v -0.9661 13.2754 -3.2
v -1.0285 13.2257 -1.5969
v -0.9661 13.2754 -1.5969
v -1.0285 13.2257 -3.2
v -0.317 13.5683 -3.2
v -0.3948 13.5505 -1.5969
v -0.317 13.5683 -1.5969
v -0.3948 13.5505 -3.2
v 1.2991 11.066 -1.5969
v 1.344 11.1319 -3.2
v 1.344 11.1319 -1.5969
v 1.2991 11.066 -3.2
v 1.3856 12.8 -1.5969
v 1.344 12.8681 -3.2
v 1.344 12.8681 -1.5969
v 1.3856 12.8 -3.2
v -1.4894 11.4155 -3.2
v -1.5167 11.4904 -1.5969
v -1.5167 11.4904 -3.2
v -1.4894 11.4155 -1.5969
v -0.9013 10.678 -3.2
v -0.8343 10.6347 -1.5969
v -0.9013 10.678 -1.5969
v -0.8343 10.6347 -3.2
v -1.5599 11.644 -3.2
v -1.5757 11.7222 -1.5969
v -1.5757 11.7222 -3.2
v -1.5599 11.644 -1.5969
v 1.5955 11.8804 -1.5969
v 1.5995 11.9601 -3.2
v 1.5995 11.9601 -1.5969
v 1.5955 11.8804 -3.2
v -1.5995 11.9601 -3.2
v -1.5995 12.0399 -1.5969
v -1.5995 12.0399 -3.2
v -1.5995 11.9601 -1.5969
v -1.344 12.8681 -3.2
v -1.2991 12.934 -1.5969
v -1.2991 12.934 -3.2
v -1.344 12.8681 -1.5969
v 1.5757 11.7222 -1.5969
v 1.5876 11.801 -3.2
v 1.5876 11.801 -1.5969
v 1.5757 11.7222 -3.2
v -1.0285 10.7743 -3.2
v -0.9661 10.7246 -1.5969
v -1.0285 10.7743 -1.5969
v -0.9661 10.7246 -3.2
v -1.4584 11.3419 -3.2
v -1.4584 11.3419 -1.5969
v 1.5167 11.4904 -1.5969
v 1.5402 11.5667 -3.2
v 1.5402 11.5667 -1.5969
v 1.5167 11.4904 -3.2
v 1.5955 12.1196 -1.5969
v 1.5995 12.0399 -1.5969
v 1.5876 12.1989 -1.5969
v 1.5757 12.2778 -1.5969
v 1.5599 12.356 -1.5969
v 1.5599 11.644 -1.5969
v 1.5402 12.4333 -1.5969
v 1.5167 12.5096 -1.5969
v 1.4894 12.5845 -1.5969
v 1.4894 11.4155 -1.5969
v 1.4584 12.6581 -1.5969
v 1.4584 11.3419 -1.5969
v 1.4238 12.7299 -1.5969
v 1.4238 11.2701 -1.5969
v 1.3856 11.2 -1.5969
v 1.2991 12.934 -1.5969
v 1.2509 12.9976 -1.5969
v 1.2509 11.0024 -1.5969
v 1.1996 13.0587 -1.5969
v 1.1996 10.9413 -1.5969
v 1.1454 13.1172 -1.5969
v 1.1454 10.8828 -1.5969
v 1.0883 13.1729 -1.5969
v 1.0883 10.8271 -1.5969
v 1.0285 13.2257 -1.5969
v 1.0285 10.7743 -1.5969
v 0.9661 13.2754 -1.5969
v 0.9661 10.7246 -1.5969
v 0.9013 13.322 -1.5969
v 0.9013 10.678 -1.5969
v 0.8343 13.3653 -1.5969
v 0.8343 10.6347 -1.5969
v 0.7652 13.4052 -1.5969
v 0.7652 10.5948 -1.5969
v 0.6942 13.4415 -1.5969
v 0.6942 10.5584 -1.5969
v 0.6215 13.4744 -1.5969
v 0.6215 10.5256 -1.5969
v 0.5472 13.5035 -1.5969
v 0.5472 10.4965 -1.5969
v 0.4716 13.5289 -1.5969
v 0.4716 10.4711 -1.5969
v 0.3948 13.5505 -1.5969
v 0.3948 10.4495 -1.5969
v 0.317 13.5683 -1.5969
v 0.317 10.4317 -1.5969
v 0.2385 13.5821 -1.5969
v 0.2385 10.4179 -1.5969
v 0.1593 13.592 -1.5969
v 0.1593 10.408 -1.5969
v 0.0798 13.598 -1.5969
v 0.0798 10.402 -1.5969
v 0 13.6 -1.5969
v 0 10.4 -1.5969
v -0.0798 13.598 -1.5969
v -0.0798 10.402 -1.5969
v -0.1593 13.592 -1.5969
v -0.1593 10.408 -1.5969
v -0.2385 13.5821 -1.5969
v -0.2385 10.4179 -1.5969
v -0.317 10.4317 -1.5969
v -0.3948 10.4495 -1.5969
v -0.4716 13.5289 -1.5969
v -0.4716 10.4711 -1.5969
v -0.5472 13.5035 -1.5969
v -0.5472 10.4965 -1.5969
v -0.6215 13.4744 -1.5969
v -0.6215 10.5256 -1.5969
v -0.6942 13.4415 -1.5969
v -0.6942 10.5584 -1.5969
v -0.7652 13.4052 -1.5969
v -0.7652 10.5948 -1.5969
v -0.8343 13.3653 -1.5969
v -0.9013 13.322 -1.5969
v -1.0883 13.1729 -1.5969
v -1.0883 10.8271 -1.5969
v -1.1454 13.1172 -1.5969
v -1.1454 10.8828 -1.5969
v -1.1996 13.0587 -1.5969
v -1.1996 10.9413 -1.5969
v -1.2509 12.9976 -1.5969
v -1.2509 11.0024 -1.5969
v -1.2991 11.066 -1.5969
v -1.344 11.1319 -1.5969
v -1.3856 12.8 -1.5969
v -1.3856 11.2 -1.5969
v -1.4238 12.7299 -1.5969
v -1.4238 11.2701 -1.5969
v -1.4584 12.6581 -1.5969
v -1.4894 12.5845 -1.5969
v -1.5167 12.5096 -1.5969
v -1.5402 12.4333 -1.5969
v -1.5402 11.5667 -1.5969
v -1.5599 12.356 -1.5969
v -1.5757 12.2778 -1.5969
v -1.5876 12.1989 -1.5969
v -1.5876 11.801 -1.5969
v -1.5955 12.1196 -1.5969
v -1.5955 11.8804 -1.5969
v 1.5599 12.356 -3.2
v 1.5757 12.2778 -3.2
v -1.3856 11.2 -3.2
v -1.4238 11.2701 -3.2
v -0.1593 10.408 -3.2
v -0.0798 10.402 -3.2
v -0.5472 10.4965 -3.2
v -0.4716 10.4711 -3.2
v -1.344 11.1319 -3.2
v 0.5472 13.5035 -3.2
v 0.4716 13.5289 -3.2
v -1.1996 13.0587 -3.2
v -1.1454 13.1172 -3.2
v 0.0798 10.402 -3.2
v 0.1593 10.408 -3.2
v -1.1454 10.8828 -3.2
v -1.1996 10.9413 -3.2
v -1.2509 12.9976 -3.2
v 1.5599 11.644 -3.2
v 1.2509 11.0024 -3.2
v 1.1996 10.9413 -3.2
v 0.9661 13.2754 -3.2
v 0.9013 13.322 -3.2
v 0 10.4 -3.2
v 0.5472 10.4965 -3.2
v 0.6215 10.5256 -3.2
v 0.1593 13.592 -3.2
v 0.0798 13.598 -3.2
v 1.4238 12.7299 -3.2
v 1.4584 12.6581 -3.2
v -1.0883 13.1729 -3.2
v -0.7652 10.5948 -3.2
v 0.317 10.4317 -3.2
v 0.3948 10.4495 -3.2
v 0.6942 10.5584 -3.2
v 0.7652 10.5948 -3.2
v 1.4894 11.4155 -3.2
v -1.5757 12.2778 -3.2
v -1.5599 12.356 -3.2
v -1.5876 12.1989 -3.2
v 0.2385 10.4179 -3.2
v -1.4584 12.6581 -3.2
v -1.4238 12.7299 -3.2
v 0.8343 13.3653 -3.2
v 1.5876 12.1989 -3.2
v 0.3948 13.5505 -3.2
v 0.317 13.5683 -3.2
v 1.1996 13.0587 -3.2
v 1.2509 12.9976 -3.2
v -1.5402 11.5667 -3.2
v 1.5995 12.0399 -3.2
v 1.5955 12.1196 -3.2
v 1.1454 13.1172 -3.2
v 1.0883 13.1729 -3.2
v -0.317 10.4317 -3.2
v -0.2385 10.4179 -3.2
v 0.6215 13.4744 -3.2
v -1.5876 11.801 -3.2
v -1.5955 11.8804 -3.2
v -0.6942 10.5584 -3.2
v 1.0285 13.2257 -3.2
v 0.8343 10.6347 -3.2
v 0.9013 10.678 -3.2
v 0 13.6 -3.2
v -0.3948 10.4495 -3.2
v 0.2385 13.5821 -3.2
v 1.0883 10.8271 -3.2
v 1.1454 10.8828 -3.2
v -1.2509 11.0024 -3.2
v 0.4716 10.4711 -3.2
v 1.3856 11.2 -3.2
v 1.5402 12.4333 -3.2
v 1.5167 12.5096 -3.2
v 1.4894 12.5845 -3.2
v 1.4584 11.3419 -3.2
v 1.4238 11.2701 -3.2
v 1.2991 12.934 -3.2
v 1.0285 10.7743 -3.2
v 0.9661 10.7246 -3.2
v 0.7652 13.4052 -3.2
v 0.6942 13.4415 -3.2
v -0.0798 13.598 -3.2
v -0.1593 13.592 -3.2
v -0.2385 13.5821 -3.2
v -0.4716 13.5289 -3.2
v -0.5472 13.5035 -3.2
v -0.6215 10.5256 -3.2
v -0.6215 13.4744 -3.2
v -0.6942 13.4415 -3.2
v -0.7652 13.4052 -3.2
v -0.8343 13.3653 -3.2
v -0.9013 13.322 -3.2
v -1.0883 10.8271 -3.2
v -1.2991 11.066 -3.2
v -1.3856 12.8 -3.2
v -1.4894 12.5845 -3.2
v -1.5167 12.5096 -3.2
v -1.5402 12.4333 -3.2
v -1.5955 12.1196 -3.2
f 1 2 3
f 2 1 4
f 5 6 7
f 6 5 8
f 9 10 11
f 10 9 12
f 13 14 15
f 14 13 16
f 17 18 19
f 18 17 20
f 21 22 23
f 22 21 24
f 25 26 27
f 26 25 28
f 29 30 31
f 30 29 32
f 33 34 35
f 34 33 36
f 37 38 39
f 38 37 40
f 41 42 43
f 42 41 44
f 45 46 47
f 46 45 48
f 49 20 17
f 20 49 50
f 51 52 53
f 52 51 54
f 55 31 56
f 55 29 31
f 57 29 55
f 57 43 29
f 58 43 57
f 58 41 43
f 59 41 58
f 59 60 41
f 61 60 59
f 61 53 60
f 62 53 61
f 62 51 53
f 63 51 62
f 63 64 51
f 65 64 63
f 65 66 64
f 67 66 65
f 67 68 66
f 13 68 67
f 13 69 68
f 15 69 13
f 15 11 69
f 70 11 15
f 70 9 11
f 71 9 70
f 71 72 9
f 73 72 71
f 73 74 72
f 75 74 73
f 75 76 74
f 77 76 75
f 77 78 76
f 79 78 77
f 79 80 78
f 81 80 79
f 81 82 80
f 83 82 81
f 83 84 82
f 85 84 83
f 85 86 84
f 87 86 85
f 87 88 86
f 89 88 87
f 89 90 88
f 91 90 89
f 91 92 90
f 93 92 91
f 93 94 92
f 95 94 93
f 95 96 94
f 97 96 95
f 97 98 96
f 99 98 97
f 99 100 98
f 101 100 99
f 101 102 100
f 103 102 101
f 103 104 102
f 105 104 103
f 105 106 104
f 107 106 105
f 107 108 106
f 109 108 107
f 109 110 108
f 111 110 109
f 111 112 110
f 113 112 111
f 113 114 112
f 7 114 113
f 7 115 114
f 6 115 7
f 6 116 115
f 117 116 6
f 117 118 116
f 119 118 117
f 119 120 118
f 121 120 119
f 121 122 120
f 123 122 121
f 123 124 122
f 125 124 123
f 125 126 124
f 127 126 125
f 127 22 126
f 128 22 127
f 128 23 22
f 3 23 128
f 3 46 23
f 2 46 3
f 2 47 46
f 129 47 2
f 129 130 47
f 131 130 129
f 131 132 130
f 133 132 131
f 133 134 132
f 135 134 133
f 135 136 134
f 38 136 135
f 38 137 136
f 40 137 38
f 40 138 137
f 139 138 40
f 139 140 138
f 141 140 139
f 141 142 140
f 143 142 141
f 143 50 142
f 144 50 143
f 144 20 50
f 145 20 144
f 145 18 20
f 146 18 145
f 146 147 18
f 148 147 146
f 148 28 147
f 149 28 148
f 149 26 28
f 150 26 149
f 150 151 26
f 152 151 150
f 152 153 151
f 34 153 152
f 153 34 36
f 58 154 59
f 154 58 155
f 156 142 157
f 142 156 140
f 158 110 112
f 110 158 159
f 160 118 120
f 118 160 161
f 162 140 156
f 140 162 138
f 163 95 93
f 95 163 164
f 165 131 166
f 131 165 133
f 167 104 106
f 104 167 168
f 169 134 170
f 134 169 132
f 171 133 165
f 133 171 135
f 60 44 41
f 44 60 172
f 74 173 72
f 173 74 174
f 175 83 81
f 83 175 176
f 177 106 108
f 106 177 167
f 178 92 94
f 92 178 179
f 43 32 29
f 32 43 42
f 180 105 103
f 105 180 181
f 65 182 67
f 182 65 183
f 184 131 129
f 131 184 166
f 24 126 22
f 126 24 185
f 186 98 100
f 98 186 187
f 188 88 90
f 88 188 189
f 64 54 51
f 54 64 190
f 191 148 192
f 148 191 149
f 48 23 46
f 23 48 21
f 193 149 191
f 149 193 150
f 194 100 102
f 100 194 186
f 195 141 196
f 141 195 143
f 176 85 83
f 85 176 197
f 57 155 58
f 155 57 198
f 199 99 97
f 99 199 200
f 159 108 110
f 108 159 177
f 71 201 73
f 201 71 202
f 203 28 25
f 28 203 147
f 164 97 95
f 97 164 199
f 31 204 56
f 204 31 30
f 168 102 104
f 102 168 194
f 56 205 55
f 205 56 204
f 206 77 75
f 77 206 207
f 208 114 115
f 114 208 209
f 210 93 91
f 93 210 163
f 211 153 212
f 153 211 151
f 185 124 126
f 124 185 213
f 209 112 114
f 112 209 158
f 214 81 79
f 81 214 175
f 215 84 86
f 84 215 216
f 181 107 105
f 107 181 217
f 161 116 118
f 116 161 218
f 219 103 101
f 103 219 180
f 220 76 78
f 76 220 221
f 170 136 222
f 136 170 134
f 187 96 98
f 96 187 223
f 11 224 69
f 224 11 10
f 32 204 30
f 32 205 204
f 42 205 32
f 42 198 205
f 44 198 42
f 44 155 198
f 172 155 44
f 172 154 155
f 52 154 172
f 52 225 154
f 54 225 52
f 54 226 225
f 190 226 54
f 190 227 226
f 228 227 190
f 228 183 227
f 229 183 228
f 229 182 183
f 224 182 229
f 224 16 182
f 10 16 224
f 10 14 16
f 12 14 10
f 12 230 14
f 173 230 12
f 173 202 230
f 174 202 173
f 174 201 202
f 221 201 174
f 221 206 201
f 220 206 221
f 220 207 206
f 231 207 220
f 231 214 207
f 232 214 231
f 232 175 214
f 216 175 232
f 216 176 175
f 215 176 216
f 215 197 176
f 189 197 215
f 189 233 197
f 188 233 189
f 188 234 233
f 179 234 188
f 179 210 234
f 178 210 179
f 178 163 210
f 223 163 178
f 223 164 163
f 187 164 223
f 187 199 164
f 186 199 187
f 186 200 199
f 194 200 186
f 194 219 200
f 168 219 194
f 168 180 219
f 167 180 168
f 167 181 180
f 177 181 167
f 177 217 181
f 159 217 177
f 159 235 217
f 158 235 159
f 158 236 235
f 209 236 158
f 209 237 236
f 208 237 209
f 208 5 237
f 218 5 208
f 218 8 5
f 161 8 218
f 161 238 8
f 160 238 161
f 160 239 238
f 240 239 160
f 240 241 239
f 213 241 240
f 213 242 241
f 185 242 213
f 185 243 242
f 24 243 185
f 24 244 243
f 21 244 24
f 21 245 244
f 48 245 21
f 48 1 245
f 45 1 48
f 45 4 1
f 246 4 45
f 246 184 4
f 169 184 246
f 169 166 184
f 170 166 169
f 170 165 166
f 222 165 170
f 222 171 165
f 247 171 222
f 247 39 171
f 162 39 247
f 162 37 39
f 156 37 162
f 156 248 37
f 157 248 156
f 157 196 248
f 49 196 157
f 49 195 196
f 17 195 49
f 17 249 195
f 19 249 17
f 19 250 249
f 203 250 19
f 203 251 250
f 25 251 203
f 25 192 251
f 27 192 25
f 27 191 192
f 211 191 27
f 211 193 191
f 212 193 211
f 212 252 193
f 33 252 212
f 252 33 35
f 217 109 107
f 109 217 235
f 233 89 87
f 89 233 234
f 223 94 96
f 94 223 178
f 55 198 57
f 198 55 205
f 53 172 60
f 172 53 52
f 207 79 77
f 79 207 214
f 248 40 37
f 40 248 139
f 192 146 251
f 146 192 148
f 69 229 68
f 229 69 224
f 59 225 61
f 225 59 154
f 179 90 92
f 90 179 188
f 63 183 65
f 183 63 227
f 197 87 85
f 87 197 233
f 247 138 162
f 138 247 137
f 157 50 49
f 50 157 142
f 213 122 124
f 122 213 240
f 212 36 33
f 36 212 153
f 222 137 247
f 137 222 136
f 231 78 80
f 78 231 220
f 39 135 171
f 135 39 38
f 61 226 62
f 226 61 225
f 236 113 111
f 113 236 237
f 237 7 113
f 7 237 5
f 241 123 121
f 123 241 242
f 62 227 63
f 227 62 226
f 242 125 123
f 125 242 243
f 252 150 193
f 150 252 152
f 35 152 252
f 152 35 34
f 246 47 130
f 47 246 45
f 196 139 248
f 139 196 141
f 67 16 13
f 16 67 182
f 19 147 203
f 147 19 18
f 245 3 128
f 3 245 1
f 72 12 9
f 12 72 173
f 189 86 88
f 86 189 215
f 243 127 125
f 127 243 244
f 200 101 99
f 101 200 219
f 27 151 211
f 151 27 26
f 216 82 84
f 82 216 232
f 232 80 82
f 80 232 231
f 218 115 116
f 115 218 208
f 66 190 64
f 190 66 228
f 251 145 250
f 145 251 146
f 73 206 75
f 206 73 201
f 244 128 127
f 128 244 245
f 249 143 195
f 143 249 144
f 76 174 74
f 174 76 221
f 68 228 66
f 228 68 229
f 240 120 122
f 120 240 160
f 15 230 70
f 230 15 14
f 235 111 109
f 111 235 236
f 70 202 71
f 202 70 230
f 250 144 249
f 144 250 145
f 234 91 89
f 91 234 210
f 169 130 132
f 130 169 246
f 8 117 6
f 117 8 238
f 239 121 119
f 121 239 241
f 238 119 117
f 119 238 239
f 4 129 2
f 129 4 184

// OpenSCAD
use <../lib.scad>
use <s/93606s01.scad>
$fa=1; $fs=0.2;
function ldraw_lib__93606p02(realsolid=false) = [
// 0 Slope Brick Curved  4 x  2 with Light Bluish Grey Rectangle Pattern
// 0 Name: 93606p02.dat
// 0 Author: Evert-Jan Boer [ejboer]
// 0 !LDRAW_ORG Part UPDATE 2020-03
// 0 !LICENSE Licensed under CC BY 2.0 and CC BY 4.0 : see CAreadme.txt
// 
// 0 BFC CERTIFY CCW
  [0,"BFC","CERTIFY"],
  [0,"BFC","CCW"],
// 
// 0 !KEYWORDS BrickLink 93606pb111, curve, Set 75275, wedge
// 
// 0 !HISTORY 2020-12-29 [PTadmin] Official Update 2020-03
// 
// 
// 1 16 0 0 0 1 0 0 0 1 0 0 0 1 s\93606s01.dat
  [1,16,0,0,0,1,0,0,0,1,0,0,0,1, ldraw_lib__s__93606s01(realsolid)],
// 
// 0 // Inlined Top Surface
// 4 71 -20 11.3582 -21.232 -20 19.9999 -40 20 19.9999 -40 20 11.3582 -21.232
  [4,71,-20,11.3582,-21.232,-20,19.9999,-40,20,19.9999,-40,20,11.3582,-21.232],
// 4 71 20 11.3582 -21.232 20 6.2254 -5 -20 6.2254 -5 -20 11.3582 -21.232
  [4,71,20,11.3582,-21.232,20,6.2254,-5,-20,6.2254,-5,-20,11.3582,-21.232],
// 4 16 20 5.0895 -1.408 -20 5.0895 -1.408 -20 6.2254 -5 20 6.2254 -5
  [4,16,20,5.0895,-1.408,-20,5.0895,-1.408,-20,6.2254,-5,20,6.2254,-5],
// 4 16 -20 0 40 -20 1.2836 19.12 20 1.2836 19.12 20 0 40
  [4,16,-20,0,40,-20,1.2836,19.12,20,1.2836,19.12,20,0,40],
// 4 16 -20 1.2836 19.12 -20 5.0895 -1.408 20 5.0895 -1.408 20 1.2836 19.12
  [4,16,-20,1.2836,19.12,-20,5.0895,-1.408,20,5.0895,-1.408,20,1.2836,19.12],
// 
// 5 24 -20 0 40 20 0 40 -20 0 61.056 -20 1.2836 19.12
  [5,24,-20,0,40,20,0,40,-20,0,61.056,-20,1.2836,19.12],
// 5 24 -20 1.2836 19.12 20 1.2836 19.12 -20 0 40 -20 5.0895 -1.408
  [5,24,-20,1.2836,19.12,20,1.2836,19.12,-20,0,40,-20,5.0895,-1.408],
// 5 24 -20 5.0895 -1.408 20 5.0895 -1.408 -20 1.2836 19.12 -20 11.3582 -21.232
  [5,24,-20,5.0895,-1.408,20,5.0895,-1.408,-20,1.2836,19.12,-20,11.3582,-21.232],
// 5 24 -20 11.3582 -21.232 20 11.3582 -21.232 -20 5.0895 -1.408 -20 19.9999 -40
  [5,24,-20,11.3582,-21.232,20,11.3582,-21.232,-20,5.0895,-1.408,-20,19.9999,-40],
// 5 24 -20 19.9999 -40 20 19.9999 -40 -20 11.3582 -21.232 -20 29.8207 -58.256
  [5,24,-20,19.9999,-40,20,19.9999,-40,-20,11.3582,-21.232,-20,29.8207,-58.256],
];
module ldraw_lib__93606p02(step=0, col=false, unit=2/5, alt=false, line=0.2, solid=!$preview)
    makepoly(ldraw_lib__93606p02(solid), step=step, col=col, unit=unit, alt=alt, line=line, solid=solid);
ldraw_lib__93606p02(line=0.2);
